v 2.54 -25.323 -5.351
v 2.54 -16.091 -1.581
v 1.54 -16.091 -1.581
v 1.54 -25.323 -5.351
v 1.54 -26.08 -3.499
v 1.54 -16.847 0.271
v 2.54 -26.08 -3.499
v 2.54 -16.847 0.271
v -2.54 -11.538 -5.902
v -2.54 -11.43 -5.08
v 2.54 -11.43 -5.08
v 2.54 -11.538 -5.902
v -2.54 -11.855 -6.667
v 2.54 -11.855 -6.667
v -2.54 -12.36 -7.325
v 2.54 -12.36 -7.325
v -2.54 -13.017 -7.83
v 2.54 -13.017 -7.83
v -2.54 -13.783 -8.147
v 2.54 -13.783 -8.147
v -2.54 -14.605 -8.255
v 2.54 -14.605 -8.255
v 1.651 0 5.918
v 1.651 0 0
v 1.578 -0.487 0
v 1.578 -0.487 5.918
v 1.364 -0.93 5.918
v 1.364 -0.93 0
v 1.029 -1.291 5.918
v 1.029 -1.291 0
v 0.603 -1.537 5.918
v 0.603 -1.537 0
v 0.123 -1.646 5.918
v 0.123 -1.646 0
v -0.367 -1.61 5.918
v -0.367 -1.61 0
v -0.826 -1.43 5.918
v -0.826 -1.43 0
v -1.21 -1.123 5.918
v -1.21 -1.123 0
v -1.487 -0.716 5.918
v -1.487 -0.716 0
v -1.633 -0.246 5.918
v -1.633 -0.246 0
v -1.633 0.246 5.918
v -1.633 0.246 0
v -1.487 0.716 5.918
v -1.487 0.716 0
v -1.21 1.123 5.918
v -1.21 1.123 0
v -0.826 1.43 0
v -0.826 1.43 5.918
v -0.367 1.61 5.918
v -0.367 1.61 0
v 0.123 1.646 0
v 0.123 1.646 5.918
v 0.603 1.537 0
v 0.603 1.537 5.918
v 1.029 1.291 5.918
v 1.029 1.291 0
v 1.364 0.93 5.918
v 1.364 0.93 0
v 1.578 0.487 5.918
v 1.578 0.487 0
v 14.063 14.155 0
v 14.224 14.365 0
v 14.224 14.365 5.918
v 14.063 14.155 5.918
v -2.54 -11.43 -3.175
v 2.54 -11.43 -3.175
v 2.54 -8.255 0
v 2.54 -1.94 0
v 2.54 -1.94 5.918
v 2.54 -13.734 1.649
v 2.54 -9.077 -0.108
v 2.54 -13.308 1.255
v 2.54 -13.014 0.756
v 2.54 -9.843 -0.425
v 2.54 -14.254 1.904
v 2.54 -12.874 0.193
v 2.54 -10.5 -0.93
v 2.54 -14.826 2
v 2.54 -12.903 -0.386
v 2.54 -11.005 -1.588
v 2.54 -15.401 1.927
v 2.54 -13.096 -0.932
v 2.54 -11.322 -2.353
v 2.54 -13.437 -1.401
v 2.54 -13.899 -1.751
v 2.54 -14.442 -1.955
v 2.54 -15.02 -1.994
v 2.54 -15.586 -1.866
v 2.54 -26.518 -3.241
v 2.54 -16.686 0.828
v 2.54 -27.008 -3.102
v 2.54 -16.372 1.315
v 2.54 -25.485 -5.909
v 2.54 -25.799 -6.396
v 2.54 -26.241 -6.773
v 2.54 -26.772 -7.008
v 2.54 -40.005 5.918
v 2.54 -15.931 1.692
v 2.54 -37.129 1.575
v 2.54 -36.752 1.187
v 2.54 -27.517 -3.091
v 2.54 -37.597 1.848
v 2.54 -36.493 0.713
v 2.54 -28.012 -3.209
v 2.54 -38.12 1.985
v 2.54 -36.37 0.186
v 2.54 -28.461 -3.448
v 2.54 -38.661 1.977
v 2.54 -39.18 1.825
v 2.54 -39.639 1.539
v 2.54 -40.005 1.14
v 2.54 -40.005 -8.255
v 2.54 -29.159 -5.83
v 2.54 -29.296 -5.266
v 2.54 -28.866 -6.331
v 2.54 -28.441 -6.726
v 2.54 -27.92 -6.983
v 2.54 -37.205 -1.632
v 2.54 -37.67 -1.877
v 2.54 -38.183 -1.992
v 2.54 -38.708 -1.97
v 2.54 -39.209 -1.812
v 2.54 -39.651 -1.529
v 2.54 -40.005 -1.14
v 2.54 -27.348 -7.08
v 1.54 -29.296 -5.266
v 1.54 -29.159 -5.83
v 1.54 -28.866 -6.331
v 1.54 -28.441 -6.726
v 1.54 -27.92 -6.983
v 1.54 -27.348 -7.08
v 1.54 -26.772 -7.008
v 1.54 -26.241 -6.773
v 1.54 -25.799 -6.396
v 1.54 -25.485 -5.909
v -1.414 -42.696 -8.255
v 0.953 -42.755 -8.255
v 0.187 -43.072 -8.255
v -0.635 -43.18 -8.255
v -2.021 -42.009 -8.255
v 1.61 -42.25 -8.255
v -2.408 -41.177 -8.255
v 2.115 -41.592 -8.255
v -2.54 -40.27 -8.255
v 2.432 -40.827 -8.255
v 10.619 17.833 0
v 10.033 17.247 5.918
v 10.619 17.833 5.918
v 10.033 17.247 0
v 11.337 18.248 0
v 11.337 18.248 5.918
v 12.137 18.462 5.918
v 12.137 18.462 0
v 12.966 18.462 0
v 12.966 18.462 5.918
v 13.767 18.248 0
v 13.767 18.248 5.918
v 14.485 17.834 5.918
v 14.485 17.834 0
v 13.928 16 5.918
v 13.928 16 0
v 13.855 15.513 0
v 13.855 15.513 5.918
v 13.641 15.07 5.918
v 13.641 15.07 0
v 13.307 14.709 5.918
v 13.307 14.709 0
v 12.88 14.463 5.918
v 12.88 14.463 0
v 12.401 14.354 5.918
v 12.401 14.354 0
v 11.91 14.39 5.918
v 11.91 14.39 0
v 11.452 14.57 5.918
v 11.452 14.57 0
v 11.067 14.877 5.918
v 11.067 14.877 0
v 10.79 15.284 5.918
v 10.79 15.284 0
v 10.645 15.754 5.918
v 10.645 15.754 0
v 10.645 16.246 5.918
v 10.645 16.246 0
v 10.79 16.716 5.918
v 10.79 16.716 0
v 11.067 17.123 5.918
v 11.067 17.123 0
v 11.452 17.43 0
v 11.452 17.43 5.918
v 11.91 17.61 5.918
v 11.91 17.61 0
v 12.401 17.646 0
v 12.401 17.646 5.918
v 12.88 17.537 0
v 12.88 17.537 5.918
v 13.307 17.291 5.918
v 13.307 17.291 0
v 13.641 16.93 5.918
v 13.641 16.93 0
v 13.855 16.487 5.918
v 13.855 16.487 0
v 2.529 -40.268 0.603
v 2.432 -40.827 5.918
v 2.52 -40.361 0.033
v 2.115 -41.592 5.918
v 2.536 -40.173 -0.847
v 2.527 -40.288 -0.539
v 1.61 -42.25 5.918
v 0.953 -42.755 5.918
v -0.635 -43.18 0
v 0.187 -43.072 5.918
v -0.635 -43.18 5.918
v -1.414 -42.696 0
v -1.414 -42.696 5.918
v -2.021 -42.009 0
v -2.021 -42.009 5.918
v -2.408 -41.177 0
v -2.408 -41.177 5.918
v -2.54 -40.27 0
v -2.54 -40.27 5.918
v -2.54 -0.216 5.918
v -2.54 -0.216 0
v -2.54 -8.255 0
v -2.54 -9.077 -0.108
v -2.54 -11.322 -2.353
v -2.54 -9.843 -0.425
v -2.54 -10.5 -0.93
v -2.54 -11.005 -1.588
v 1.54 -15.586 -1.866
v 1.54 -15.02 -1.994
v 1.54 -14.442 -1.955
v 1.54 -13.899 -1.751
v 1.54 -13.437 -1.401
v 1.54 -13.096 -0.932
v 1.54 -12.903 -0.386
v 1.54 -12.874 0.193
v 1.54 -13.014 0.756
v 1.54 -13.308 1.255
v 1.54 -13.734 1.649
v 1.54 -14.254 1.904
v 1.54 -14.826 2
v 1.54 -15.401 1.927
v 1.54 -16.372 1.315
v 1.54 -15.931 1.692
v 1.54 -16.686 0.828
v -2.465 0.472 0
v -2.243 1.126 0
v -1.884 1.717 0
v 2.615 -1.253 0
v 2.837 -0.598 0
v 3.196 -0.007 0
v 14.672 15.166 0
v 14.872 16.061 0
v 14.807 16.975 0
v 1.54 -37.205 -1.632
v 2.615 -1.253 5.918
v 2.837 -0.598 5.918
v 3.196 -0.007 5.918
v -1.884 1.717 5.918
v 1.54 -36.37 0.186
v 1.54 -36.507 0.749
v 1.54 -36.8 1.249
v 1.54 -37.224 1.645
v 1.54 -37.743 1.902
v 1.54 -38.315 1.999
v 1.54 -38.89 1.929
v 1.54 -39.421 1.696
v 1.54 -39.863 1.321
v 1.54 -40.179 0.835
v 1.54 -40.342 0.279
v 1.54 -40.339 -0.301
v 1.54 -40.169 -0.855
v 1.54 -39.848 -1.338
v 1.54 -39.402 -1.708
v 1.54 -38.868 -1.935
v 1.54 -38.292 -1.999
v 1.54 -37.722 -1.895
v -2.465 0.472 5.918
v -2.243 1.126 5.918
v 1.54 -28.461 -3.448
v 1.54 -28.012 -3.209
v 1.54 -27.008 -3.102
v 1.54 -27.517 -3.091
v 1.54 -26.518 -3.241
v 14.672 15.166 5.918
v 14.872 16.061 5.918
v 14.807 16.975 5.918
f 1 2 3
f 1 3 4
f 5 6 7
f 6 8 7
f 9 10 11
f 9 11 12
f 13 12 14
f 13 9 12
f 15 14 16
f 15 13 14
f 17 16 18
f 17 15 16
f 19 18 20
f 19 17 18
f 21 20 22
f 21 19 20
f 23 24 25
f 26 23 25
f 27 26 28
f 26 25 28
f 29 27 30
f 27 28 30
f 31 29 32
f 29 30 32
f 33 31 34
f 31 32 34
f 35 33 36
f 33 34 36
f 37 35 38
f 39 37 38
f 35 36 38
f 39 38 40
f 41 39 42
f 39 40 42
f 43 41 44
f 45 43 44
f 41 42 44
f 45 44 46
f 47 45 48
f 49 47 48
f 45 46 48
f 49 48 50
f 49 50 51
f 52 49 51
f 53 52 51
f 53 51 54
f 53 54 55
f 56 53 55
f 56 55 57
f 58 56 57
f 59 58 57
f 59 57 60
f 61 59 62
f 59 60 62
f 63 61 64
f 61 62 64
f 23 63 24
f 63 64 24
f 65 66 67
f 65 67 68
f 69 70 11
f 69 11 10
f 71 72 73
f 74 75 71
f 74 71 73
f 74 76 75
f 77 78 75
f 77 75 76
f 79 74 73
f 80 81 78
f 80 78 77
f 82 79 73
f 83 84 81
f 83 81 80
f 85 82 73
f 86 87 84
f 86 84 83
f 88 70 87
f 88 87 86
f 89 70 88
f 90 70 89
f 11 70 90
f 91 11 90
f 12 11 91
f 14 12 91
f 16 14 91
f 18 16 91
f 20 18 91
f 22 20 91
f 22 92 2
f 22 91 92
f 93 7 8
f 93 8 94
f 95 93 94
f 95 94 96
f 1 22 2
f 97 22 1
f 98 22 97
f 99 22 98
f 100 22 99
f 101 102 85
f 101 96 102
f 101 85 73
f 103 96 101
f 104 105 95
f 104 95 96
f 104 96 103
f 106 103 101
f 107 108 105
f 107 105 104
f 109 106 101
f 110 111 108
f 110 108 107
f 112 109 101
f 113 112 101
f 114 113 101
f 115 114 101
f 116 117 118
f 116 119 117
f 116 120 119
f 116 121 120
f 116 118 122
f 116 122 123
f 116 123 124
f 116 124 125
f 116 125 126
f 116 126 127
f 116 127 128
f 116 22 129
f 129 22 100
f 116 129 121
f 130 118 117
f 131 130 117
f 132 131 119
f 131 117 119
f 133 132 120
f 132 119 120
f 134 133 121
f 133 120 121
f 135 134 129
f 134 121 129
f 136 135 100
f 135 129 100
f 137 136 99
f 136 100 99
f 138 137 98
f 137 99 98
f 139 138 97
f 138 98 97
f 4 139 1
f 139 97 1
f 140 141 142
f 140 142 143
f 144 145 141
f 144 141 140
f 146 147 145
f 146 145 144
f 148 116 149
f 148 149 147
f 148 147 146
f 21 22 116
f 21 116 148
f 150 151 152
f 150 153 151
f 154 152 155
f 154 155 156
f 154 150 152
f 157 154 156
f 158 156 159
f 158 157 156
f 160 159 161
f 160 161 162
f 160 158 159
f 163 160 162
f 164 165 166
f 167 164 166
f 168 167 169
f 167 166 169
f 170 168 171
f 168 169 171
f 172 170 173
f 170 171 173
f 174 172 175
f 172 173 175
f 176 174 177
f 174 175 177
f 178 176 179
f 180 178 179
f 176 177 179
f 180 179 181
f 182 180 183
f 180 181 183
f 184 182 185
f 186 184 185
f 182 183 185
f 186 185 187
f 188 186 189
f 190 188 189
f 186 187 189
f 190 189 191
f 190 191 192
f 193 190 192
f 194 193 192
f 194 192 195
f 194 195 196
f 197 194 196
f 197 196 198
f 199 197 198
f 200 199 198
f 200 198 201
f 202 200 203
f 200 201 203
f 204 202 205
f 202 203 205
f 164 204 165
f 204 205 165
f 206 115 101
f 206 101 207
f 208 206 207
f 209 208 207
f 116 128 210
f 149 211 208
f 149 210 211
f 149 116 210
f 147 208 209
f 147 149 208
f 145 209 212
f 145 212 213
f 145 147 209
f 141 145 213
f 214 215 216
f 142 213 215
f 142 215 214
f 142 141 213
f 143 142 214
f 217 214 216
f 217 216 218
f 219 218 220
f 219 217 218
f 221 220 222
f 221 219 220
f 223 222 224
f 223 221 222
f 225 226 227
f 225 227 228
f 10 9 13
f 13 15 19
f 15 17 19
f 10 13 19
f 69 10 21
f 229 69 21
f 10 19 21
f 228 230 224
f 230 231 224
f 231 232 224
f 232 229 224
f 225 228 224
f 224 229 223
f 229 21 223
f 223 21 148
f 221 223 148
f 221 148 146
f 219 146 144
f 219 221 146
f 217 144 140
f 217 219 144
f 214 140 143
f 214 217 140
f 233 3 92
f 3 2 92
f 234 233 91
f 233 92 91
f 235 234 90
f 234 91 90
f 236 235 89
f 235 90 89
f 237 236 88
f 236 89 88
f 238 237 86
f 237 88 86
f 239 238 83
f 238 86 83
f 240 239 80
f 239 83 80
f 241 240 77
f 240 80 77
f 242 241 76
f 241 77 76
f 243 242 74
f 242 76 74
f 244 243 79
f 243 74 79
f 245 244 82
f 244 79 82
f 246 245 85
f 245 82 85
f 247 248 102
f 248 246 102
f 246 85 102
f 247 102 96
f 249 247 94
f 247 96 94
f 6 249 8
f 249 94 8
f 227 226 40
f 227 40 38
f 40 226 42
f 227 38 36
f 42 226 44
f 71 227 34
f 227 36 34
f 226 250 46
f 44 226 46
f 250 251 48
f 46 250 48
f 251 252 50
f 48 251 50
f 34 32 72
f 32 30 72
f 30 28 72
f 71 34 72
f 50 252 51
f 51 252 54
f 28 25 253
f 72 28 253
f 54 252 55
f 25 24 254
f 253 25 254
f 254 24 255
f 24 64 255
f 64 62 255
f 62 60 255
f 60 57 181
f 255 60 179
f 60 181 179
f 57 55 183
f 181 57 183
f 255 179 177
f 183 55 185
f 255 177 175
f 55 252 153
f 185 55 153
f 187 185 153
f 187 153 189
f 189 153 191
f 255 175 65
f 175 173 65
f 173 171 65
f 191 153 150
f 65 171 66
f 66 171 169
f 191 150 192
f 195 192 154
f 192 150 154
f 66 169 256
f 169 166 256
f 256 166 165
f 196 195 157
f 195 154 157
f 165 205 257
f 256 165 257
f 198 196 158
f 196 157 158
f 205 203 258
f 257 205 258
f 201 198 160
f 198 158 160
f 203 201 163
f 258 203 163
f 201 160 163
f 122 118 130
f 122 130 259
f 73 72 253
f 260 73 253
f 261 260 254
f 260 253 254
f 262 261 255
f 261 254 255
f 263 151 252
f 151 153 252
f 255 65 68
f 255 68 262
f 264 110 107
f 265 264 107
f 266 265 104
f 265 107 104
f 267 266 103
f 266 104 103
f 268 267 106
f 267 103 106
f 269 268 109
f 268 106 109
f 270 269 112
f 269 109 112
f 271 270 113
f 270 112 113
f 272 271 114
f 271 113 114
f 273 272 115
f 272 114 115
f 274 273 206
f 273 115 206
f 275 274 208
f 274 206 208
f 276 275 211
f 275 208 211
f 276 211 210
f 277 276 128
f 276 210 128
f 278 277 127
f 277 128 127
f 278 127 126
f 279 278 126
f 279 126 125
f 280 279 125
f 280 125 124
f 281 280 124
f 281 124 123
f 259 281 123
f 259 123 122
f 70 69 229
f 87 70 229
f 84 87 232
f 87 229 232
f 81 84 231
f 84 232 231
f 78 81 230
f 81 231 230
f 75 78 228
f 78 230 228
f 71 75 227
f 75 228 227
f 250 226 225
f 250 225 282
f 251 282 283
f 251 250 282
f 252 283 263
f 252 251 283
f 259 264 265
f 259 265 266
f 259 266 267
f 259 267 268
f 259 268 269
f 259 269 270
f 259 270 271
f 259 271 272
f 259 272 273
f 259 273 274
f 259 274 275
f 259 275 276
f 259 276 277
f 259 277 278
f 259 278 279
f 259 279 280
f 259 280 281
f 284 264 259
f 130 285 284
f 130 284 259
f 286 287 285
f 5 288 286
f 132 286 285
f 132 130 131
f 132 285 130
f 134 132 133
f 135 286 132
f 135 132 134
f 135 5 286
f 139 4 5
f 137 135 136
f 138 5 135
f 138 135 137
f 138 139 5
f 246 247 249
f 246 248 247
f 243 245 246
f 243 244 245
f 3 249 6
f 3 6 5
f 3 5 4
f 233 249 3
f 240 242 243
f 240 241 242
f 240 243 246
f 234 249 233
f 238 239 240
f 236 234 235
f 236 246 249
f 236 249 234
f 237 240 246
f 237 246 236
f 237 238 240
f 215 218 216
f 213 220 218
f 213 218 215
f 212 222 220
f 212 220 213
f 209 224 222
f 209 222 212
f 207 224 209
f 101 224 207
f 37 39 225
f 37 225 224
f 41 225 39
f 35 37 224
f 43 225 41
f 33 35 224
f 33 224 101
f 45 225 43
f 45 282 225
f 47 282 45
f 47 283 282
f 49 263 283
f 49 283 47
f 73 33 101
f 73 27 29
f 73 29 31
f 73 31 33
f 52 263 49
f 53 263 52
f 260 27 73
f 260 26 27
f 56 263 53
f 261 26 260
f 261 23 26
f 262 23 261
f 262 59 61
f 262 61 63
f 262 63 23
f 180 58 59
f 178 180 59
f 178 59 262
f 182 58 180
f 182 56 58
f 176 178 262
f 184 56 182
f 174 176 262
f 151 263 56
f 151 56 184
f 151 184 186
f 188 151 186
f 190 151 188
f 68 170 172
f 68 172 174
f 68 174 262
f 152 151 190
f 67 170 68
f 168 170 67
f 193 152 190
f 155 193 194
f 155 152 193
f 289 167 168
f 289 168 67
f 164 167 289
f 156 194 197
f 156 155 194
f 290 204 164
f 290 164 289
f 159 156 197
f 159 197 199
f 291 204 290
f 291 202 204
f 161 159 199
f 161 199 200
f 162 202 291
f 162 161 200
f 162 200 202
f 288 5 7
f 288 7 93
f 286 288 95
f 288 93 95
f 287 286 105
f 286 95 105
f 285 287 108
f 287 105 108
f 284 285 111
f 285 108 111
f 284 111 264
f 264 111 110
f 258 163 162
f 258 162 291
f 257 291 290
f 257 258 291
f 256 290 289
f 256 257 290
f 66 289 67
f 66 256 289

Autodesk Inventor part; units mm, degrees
ref_plane "YZ Plane" through (0, 0, 0) normal (1, 0, 0) x (0, 1, 0)
ref_plane "XZ Plane" through (0, 0, 0) normal (0, 1, 0) x (-1, 0, 0)
ref_plane "XY Plane" through (0, 0, 0) normal (0, 0, 1) x (1, 0, 0)
sketch "Sketch1" plane through (0, 0, 0) normal (0, 0, 1) x (1, 0, 0)
  line L0 (0, 0) -> (0, -43.18)
  line L1 (0, 0) -> (12.2773, 16)
  line L2 (0, 0) -> (20.1676, 0) construction
  circle A0 centre (12.2773, 16) radius 1.651
  circle A1 centre (0, 0) radius 1.651
  line L3 (10.0328, 17.2474) -> (-2.54, 0.8622)
  line L4 (-2.54, 0.8622) -> (-2.54, -43.18)
  line L5 (14.063, 14.1549) -> (2.54, -0.8622)
  line L6 (2.54, -0.8622) -> (2.54, -43.18)
  line L7 (10.0328, 17.2474) -> (11.9656, 19.7663)
  line L8 (11.9656, 19.7663) -> (15.9959, 16.6738)
  line L9 (15.9959, 16.6738) -> (14.063, 14.1549)
  line L10 (-2.54, -43.18) -> (2.54, -43.18)
  dimension "d0" = 43.18
  dimension "d1" = 20.1676
  dimension "d2" = 52.5
  dimension "d3" = 3.302
  dimension "d4" = 3.302
  dimension "d5" = 2.54
  dimension "d6" = 2.54
  dimension "d7" = 3.175
extrude "Extrusion1" add sketch "Sketch1" along normal blind 5.9182
fillet "Fillet1" radius 3.175 6 edges at (11.9656, 19.7663, 2.9591) (15.9959, 16.6738, 2.9591) (-2.54, 0.8622, 2.9591) (2.54, -0.8622, 2.9591) (2.54, -43.18, 2.9591) (-2.54, -43.18, 2.9591)
sketch "Sketch2" plane through (0, 0, 0) normal (0, 0, -1) x (-1, 0, 0)
  line L0 (-2.54, -40.005) -> (-2.54, -1.94) projected
  line L1 (-2.54, -11.43) -> (2.54, -11.43)
  line L2 (2.54, -0.2156) -> (2.54, -40.2701) projected
  arc A0 (-2.54, -40.005) -> (0.635, -43.18) centre (0.635, -40.005) ccw projected
  circle A1 centre (0, 0) radius 1.651 projected
  circle A2 centre (-12.2773, 16) radius 1.651 projected
  arc A3 (0.635, -43.18) -> (2.54, -40.2701) centre (-0.635, -40.2701) ccw projected
  line L3 (2.54, -0.2156) -> (2.54, -40.2701) projected
  arc A4 (2.54, -0.2156) -> (1.8839, 1.7173) centre (-0.635, -0.2156) ccw projected
  line L4 (-10.0328, 17.2474) -> (1.8839, 1.7173) projected
  arc A5 (-10.0328, 17.2474) -> (-14.4845, 17.8335) centre (-12.5517, 15.3146) ccw projected
  arc A6 (-14.4845, 17.8335) -> (-14.2244, 14.3652) centre (-11.7055, 16.298) ccw projected
  line L5 (-3.1961, -0.0072) -> (-14.2244, 14.3652) projected
  arc A7 (-2.54, -1.94) -> (-3.1961, -0.0072) centre (-5.715, -1.94) ccw projected
  line L6 (-2.54, -40.005) -> (-2.54, -1.94) projected
  arc A8 (-2.54, -40.005) -> (0.635, -43.18) centre (0.635, -40.005) ccw projected
  point P0 (0.635, -43.18)
  dimension "d11" = 31.75
extrude "Extrusion2" add sketch "Sketch2" along normal blind 8.255 contours L0 L1 L2 A3 A0
fillet "Fillet2" radius 3.175 2 edges at (0, -11.43, 0) (0, -11.43, -8.255)
sketch "Sketch3" plane through (2.54, -40.005, 5.9182) normal (1, 0, 0) x (0, 0, -1)
  circle A0 centre (5.9182, 1.6434) radius 2
  circle A1 centre (5.9182, 25.1399) radius 2
  arc A2 (14.1732, 25.4) -> (10.9982, 28.575) centre (10.9982, 25.4) ccw projected
  line L0 (9.0932, 28.575) -> (10.9982, 28.575) projected
  arc A3 (5.9182, 31.75) -> (9.0932, 28.575) centre (9.0932, 31.75) ccw projected
  line L1 (5.9182, 31.75) -> (5.9182, 38.065) projected
  line L2 (0, 38.065) -> (5.9182, 38.065) projected
  line L3 (0, 0) -> (0, 38.065) projected
  line L4 (0, 0) -> (14.1732, 0) projected
  line L5 (14.1732, 25.4) -> (14.1732, 0) projected
  circle A4 centre (10.9982, 12.7) radius 2
  line L6 (5.9182, 1.6434) -> (10.9982, 12.7)
  line L7 (10.9982, 12.7) -> (5.9182, 25.1399)
  line L8 (4.9924, 24.7618) -> (9.9085, 12.7234)
  line L9 (9.9085, 12.7234) -> (5.0095, 2.0609)
  line L10 (6.844, 25.518) -> (12.0879, 12.6766)
  line L11 (12.0879, 12.6766) -> (6.8269, 1.2259)
  point P0 (5.9182, 40.005)
  point P1 (5.6472, 23.1583)
  point P2 (9.4176, 13.9254)
  point P3 (9.3664, 11.5436)
  point P4 (5.7326, 3.6348)
  point P5 (7.55, 2.7998)
  point P6 (11.1838, 10.7086)
  point P7 (11.2692, 14.6816)
  point P8 (7.4988, 23.9144)
  dimension "d15" = 4
  dimension "d16" = 4
  dimension "d17" = 4
  dimension "d18" = 1
  dimension "d19" = 1
extrude "Extrusion3" cut sketch "Sketch3" against normal blind 1 contours A0 L4 | A0 L6 A4 L11 | A0 L4 | A0 L9 A4 L6 | L11 L10 A4 | A4 L6 L7 L10 L11 | A4 L9 L8 L7 L6 | A4 L8 L9 | A4 L7 A1 L10 | L8 A1 L7 A4 | A1
properties part number "Hank - claw"
